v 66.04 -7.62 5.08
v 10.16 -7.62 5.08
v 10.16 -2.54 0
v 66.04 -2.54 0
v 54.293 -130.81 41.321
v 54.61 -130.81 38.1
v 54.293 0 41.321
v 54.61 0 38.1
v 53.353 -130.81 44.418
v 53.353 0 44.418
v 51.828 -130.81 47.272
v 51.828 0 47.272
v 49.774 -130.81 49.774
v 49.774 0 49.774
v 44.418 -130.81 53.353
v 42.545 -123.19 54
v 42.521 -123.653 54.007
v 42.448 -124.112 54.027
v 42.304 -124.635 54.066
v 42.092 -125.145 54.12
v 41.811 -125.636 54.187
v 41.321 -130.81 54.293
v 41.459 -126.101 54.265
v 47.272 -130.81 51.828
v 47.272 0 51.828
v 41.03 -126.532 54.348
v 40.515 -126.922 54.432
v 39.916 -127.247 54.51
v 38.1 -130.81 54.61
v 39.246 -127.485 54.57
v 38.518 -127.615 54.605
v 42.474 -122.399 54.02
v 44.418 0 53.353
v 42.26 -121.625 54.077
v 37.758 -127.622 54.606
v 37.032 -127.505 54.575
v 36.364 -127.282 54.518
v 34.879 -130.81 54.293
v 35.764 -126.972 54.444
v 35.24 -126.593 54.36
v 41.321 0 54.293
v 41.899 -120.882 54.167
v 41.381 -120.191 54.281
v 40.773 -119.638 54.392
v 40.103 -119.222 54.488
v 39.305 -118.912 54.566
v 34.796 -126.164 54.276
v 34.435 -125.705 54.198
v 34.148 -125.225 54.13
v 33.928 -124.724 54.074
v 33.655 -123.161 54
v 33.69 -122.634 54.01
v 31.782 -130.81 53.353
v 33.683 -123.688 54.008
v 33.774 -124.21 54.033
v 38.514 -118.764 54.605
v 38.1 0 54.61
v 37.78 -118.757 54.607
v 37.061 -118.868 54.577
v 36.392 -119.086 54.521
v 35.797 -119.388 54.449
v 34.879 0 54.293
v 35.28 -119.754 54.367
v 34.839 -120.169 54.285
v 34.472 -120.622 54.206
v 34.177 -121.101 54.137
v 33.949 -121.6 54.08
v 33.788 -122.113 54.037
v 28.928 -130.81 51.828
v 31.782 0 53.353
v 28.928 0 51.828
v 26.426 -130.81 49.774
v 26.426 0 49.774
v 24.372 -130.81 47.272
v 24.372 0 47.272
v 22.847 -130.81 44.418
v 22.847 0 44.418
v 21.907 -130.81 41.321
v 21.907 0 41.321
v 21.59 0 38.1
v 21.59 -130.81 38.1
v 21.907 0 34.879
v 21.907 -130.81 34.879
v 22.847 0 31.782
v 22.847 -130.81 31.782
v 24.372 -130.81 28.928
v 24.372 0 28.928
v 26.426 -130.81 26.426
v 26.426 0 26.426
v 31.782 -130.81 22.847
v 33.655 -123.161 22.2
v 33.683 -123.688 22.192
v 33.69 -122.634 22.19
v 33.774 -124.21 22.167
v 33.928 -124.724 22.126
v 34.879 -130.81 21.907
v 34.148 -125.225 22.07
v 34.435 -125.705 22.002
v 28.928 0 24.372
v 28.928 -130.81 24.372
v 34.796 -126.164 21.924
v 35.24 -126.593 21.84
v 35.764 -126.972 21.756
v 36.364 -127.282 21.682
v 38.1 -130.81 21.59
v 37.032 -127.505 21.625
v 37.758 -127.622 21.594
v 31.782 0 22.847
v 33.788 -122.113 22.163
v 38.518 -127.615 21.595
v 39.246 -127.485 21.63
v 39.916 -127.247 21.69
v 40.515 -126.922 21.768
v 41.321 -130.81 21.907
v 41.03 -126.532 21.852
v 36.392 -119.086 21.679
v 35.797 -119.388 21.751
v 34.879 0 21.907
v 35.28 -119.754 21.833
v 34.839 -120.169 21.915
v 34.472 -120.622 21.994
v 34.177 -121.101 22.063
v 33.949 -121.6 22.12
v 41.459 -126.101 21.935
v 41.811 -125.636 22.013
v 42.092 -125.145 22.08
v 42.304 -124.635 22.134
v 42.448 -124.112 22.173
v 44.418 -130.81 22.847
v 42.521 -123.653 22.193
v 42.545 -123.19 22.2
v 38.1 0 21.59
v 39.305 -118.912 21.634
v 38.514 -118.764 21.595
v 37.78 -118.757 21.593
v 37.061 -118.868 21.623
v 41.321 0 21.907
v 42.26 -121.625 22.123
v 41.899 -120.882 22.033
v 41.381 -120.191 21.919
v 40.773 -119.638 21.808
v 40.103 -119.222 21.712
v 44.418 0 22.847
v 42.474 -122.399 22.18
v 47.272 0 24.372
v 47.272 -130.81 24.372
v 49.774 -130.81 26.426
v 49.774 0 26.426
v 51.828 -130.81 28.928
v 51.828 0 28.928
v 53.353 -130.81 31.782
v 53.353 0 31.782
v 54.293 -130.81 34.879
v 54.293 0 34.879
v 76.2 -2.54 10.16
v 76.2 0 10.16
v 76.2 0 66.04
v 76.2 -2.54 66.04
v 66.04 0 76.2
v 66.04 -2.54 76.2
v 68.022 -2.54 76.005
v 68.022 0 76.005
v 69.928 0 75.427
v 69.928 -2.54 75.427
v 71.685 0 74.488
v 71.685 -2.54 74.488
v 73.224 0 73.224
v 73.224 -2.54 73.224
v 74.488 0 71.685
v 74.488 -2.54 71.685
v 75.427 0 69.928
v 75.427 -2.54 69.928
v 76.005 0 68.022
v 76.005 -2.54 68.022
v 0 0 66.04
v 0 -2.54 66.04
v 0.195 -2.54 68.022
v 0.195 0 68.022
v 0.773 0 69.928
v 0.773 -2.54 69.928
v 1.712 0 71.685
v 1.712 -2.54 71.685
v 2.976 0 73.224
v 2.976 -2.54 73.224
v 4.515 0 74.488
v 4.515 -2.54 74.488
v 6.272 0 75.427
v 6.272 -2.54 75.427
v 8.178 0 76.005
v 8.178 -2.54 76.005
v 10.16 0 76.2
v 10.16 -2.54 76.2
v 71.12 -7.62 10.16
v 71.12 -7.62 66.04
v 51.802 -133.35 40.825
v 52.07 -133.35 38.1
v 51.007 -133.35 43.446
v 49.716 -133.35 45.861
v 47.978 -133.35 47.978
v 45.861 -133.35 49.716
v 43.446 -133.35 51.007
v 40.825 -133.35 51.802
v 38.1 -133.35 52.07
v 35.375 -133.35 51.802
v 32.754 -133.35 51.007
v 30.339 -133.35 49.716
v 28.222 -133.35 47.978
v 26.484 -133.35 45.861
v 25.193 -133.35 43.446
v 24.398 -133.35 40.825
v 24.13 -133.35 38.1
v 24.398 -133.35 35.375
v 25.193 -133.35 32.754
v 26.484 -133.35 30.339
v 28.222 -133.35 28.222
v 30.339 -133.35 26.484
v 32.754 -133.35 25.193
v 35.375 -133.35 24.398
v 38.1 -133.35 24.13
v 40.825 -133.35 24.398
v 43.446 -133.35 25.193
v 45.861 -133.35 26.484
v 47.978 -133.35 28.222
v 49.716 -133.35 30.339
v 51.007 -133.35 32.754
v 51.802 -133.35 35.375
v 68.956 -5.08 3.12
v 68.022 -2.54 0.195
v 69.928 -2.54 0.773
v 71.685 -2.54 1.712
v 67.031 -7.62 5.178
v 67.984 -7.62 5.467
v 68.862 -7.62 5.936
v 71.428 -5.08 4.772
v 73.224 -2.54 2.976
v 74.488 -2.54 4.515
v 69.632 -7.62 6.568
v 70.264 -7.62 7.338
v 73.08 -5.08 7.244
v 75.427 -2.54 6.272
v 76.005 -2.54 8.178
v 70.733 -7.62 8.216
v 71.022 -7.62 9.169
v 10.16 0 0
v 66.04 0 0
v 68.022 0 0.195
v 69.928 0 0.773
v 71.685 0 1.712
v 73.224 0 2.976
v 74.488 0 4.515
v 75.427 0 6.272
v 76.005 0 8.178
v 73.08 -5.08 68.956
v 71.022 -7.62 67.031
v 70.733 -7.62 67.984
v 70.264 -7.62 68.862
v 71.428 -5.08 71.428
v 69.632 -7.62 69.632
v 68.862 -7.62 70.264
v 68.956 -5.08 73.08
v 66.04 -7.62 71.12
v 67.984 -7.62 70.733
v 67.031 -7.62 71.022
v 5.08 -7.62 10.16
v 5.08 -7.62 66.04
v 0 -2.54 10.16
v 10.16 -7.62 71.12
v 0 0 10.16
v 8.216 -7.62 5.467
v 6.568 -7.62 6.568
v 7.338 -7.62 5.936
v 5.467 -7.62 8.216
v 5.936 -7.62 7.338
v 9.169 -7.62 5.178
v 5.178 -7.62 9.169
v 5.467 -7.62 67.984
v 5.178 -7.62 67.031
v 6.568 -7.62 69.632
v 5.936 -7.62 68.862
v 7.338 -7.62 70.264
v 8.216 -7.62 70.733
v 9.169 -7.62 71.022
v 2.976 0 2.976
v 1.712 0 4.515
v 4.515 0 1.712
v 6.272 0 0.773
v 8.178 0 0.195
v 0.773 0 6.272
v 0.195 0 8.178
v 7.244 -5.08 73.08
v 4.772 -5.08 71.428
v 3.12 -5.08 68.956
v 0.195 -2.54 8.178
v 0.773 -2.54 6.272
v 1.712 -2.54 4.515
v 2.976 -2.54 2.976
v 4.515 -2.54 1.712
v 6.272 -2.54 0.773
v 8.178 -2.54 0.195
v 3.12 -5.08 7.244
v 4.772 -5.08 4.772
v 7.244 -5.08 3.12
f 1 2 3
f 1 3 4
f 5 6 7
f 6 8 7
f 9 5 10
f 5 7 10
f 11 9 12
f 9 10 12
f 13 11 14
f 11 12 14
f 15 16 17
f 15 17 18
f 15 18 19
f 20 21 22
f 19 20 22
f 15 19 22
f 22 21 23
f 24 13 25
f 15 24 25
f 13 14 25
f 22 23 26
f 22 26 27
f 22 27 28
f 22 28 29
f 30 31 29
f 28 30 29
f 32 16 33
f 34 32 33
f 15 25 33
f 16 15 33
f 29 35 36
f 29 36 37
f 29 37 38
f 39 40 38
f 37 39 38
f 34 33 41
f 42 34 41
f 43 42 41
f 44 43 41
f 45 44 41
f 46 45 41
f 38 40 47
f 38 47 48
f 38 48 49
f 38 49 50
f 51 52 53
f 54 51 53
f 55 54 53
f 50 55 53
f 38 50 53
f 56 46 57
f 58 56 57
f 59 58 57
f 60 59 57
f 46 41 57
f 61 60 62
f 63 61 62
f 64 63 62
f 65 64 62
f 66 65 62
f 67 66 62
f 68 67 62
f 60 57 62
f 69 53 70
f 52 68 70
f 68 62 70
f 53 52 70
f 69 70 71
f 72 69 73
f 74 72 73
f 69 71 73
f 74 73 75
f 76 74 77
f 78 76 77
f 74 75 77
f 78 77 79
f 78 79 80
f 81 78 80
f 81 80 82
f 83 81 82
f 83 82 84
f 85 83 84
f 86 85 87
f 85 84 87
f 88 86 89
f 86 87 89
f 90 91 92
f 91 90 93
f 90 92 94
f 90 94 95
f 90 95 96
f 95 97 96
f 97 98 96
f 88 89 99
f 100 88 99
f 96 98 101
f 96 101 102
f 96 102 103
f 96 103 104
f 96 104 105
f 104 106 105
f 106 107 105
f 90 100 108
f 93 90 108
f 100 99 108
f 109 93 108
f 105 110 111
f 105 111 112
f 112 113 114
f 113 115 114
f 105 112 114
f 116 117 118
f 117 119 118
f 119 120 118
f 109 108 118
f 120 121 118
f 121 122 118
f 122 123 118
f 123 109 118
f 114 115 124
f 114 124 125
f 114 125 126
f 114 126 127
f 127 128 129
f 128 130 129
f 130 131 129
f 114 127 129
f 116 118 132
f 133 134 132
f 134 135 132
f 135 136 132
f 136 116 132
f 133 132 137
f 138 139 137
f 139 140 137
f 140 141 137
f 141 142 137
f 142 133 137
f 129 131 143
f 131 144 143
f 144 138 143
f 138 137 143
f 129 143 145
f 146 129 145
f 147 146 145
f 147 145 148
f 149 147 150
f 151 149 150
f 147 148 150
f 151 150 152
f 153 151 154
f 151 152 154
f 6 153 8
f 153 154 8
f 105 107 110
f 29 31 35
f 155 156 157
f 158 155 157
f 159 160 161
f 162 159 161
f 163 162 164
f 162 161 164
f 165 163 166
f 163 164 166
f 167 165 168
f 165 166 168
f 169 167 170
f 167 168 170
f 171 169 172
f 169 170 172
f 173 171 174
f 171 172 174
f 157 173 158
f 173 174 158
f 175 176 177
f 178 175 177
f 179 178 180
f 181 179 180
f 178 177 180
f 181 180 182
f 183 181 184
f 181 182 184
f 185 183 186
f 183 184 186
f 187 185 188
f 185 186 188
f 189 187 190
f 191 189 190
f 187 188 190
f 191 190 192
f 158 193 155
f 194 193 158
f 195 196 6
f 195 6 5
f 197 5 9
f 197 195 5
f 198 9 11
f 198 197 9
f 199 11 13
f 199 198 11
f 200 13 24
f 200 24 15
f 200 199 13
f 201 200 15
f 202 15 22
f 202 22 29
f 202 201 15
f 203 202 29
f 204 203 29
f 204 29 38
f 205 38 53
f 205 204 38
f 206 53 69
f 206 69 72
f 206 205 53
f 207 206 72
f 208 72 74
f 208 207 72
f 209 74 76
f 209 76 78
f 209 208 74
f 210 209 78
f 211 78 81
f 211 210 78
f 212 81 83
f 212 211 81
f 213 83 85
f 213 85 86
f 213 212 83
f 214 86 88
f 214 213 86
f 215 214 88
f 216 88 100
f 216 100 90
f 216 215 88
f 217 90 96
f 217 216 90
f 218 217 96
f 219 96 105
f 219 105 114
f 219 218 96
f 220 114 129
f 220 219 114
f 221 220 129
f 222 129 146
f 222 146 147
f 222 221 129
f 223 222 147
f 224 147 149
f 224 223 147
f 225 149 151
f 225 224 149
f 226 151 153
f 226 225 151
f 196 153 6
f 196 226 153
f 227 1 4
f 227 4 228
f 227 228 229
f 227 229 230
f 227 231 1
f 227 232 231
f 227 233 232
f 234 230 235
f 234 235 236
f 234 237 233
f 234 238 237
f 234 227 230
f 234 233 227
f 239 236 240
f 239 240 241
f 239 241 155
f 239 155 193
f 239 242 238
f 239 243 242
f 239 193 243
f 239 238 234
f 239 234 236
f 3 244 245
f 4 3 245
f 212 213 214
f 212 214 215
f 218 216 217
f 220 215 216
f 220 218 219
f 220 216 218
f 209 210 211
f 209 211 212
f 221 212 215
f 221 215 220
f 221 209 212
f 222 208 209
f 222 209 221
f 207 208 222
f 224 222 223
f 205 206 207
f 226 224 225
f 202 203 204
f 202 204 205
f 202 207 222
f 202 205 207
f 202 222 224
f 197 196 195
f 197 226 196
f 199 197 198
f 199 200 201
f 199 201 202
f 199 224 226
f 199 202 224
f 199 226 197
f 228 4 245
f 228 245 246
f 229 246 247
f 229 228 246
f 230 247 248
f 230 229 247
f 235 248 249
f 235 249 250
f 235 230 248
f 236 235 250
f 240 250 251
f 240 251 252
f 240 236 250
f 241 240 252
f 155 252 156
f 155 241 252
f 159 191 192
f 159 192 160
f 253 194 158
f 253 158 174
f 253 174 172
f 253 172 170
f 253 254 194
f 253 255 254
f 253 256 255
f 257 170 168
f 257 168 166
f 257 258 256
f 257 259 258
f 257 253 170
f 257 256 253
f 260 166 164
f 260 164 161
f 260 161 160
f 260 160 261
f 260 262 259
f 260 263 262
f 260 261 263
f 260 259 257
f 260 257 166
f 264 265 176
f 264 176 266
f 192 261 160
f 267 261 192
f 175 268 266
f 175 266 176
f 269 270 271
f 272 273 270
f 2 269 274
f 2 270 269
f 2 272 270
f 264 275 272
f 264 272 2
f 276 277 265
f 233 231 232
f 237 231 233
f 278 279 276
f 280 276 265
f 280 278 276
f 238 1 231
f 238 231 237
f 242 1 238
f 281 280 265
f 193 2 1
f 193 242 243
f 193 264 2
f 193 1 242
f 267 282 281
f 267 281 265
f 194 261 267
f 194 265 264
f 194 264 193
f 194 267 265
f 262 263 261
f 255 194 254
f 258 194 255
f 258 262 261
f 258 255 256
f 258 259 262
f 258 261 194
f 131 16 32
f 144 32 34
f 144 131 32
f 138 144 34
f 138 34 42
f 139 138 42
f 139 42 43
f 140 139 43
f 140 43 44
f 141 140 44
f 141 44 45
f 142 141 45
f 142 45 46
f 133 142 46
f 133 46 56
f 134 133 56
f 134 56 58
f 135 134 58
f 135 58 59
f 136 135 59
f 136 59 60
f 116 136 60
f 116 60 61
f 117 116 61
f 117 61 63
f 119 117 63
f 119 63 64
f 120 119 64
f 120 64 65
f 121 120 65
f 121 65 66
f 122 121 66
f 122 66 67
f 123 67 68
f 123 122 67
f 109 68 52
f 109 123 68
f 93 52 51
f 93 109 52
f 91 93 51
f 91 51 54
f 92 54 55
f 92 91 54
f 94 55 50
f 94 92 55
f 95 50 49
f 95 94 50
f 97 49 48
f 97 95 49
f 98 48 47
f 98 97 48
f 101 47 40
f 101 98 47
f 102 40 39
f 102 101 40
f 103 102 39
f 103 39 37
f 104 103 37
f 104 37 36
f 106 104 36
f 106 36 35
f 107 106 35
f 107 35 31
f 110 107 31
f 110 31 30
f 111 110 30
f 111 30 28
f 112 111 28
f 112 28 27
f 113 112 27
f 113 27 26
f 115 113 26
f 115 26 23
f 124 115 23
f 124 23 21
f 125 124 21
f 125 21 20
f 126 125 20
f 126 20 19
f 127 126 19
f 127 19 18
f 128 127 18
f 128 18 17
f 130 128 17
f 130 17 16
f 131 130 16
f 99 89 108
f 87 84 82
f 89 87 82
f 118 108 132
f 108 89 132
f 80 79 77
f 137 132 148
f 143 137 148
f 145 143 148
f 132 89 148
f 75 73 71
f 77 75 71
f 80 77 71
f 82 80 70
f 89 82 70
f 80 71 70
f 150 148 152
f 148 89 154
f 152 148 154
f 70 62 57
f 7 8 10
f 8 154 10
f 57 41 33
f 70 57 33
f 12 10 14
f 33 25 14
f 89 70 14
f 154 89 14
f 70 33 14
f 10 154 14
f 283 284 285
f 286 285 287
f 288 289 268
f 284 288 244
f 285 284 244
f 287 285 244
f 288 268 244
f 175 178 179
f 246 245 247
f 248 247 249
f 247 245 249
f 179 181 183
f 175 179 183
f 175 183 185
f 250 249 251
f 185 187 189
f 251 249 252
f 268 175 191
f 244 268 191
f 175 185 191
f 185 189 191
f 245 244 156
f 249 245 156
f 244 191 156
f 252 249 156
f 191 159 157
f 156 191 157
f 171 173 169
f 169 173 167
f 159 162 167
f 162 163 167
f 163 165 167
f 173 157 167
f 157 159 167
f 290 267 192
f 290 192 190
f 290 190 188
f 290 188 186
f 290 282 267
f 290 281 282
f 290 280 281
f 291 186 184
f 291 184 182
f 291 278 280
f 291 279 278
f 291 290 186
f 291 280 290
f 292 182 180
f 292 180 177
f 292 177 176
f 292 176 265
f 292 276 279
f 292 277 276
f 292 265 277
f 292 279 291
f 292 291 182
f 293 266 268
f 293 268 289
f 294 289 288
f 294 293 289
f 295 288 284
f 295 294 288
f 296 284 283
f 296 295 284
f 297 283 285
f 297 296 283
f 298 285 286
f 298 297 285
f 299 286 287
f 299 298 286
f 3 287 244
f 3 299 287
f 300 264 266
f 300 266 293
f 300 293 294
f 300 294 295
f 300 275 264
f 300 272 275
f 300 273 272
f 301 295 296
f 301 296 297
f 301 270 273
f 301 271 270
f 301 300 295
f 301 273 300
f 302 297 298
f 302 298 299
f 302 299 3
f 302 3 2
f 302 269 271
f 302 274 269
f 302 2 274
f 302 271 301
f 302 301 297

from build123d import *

# Parameters (mm, degrees)
F0_R      = 16.51
F1_DEPTH  = 133.35
F2_W      = 76.2
F2_H      = 76.2
F3_DEPTH  = 7.62
F4_R      = 10.16
F5_R      = 10.16
F6_R      = 10.16
F7_R      = 10.16
F8_SIZE   = 5.08
F9_SIZE   = 2.54
F10_R     = 4.445
F11_DEPTH = 76.2


with BuildPart() as f1:
    # F0 (on Front) → F1 (new body)
    with BuildSketch(Plane.XZ):
        with Locations((38.1, 38.1)):
            Circle(F0_R)
    extrude(amount=F1_DEPTH)

    # F9
    f9_edges = [f1.edges().sort_by_distance(p)[0] for p in [
        (21.59, -133.35, 38.1),
    ]]
    chamfer(f9_edges, length=F9_SIZE)

    # F10 (on Top) → F11 (cut)
    with BuildSketch(Plane.XY):
        with Locations((38.1, -123.19)):
            Circle(F10_R)
    extrude(amount=F11_DEPTH, mode=Mode.SUBTRACT)


with BuildPart() as f3:
    # F2 (on Front) → F3 (new body)
    with BuildSketch(Plane.XZ):
        with Locations((38.1, 38.1)):
            Rectangle(F2_W, F2_H)
    extrude(amount=F3_DEPTH)

    # F4
    f4_edges = [f3.edges().sort_by_distance(p)[0] for p in [
        (0, -3.81, 0),
    ]]
    fillet(f4_edges, radius=F4_R)

    # F5
    f5_edges = [f3.edges().sort_by_distance(p)[0] for p in [
        (76.2, -3.81, 0),
    ]]
    fillet(f5_edges, radius=F5_R)

    # F6
    f6_edges = [f3.edges().sort_by_distance(p)[0] for p in [
        (0, -3.81, 76.2),
    ]]
    fillet(f6_edges, radius=F6_R)

    # F7
    f7_edges = [f3.edges().sort_by_distance(p)[0] for p in [
        (76.2, -3.81, 76.2),
    ]]
    fillet(f7_edges, radius=F7_R)

    # F8
    f8_edges = [f3.edges().sort_by_distance(p)[0] for p in [
        (38.1, -7.62, 0),
    ]]
    chamfer(f8_edges, length=F8_SIZE)


solid = Compound([f1.part, f3.part])
